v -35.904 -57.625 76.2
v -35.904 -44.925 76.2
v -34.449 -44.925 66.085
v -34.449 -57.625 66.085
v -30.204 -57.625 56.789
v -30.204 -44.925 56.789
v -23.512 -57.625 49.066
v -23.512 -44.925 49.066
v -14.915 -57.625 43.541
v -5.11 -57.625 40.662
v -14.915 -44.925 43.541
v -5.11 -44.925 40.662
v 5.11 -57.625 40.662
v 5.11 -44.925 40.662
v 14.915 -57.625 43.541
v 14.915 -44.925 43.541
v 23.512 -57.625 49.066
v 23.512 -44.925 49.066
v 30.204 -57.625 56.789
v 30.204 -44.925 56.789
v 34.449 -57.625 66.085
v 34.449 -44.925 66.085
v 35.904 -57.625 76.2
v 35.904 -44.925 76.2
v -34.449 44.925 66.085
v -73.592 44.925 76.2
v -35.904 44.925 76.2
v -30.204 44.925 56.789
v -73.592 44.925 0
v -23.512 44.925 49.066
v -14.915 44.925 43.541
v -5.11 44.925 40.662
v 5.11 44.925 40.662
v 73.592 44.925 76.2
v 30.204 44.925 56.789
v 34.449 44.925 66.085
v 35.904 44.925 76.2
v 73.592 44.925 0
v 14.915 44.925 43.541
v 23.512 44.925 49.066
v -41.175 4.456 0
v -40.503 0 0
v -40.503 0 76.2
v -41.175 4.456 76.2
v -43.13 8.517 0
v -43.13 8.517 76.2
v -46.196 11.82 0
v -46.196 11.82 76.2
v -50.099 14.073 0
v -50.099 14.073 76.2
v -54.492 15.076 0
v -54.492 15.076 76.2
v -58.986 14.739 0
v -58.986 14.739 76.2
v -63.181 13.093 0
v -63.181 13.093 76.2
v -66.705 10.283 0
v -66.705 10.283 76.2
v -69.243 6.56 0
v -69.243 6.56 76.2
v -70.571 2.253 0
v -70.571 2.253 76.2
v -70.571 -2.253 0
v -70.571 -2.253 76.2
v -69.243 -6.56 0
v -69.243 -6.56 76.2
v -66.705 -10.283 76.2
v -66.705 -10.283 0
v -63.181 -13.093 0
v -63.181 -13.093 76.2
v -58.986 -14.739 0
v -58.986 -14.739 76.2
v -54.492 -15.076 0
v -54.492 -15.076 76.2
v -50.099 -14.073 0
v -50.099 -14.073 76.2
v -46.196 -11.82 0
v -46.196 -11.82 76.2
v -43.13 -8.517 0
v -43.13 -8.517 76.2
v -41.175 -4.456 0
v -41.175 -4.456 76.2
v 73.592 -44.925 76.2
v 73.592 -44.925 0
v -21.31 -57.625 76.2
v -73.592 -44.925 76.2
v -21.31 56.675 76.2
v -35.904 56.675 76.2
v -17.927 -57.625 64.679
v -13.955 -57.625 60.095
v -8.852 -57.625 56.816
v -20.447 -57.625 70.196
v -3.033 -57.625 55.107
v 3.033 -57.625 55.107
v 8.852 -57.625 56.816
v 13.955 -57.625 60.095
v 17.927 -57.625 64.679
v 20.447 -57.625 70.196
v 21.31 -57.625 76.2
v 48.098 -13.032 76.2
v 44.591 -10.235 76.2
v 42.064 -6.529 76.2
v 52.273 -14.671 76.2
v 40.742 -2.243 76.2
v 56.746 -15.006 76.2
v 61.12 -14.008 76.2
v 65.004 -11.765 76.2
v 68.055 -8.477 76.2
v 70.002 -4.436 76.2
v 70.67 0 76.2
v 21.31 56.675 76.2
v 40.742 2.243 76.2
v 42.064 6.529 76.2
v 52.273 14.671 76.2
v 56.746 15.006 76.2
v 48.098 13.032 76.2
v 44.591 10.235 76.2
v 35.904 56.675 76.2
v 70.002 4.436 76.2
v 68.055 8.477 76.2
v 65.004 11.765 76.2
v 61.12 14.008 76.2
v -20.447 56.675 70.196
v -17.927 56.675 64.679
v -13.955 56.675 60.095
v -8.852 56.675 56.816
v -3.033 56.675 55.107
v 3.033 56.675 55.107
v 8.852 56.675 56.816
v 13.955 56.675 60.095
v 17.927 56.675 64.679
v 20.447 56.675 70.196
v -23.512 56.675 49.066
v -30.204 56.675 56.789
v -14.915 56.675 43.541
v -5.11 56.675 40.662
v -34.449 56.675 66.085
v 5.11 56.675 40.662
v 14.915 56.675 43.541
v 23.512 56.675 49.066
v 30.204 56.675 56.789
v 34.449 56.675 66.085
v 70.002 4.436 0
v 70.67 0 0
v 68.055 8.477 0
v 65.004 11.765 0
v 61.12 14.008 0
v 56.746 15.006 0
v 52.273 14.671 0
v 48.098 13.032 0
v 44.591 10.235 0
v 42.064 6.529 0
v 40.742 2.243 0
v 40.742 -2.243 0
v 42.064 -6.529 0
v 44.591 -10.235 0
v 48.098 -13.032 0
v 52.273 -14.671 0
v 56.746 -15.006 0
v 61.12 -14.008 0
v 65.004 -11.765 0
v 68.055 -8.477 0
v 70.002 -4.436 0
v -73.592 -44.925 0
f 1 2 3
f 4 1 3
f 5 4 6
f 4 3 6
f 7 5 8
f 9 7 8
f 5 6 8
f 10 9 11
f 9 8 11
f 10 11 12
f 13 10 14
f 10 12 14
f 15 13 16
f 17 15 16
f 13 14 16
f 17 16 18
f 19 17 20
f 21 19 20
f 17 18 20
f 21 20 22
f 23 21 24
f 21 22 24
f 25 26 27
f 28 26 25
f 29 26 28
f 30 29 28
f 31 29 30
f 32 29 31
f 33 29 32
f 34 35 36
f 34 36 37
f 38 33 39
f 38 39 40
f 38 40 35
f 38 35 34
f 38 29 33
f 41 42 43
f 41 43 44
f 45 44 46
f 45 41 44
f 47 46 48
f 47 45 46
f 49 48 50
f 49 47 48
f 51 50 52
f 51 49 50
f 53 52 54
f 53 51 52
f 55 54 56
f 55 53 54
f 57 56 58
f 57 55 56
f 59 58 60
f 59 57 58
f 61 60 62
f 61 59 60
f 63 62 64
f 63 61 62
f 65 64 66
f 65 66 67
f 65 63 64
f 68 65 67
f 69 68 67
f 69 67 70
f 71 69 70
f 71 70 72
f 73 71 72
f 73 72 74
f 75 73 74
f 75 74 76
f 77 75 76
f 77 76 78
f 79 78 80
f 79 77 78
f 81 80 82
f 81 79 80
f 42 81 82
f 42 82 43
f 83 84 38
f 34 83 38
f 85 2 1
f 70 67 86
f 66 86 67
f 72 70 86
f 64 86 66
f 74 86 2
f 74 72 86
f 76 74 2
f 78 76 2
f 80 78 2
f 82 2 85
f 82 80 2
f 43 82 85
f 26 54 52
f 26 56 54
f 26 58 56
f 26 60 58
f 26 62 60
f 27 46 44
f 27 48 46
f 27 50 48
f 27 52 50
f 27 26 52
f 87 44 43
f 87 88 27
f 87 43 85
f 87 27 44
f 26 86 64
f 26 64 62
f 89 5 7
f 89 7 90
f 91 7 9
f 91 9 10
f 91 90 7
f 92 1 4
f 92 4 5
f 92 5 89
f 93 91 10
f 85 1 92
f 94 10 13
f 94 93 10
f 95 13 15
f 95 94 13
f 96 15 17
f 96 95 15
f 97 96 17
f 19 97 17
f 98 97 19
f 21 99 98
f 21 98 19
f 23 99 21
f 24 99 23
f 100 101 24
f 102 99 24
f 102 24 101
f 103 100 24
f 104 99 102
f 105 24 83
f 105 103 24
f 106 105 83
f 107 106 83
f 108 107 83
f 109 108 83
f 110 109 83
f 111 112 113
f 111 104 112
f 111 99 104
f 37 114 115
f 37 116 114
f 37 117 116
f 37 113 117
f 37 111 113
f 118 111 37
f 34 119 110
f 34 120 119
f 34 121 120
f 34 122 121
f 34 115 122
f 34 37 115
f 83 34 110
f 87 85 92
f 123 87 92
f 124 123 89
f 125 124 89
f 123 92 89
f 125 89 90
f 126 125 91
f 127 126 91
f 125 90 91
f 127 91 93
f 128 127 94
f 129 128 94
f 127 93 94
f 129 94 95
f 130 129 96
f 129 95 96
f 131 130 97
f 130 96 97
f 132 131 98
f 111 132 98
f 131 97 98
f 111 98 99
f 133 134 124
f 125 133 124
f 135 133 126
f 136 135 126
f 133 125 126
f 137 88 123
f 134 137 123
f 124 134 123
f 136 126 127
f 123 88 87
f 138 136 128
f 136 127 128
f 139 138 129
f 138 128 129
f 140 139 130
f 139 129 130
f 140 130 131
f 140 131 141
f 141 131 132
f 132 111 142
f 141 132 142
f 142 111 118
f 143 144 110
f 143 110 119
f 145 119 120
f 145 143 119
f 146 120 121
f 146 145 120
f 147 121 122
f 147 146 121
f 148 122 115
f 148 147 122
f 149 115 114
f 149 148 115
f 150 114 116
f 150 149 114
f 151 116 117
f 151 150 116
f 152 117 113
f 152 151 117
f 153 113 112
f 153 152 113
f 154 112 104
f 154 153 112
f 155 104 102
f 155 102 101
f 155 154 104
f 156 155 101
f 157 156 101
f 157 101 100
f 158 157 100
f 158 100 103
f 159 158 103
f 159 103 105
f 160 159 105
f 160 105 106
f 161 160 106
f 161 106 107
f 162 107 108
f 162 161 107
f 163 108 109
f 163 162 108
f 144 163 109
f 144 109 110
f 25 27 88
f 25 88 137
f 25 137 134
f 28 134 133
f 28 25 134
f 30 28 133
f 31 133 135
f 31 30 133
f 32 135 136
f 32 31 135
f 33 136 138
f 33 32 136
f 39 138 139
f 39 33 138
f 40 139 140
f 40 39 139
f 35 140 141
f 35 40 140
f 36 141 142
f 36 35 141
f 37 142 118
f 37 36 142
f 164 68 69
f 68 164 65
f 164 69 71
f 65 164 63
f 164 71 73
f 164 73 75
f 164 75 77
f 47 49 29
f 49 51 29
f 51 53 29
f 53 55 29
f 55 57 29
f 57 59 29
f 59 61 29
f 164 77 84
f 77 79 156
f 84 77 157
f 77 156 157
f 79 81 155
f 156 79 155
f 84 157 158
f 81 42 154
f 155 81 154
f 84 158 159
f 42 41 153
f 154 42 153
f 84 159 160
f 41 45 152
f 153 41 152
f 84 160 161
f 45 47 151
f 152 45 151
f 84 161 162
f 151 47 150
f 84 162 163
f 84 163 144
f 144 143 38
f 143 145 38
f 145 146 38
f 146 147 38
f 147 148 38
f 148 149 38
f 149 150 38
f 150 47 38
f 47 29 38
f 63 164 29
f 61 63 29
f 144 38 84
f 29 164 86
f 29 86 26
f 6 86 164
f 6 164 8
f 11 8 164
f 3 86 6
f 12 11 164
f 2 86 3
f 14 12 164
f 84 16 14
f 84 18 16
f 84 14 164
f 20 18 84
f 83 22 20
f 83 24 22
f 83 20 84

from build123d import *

# Parameters (mm, degrees)
F0_W     = 147.184163332
F0_H     = 89.8508056998
F0_R     = 15.1184260195
F0_R_2   = 15.0482996588
F1_DEPTH = 76.2
F3_DEPTH = 101.6
F4_DEPTH = 12.7
F6_DEPTH = 114.301


with BuildPart() as f1:
    # F0 (on Top) → F1 (new body)
    with BuildSketch(Plane.XY):
        Rectangle(F0_W, F0_H)
        with Locations((-55.6219257414, 0)):
            Circle(F0_R, mode=Mode.SUBTRACT)
        with Locations((55.6219220161, 0)):
            Circle(F0_R_2, mode=Mode.SUBTRACT)
    extrude(amount=F1_DEPTH)

    # F2 (on face) → F3 (join)
    with BuildSketch(Plane.XZ.offset(44.9254028499)):
        with BuildLine():
            ThreePointArc((-35.903516253, 76.2), (0, 40.296483747), (35.903516253, 76.2))
            Line((35.903516253, 76.2), (-35.903516253, 76.2))
        make_face()
    extrude(amount=-F3_DEPTH)

    # F2 (on face) → F4 (join)
    with BuildSketch(Plane.XZ.offset(44.9254028499)):
        with BuildLine():
            ThreePointArc((-35.903516253, 76.2), (0, 40.296483747), (35.903516253, 76.2))
            Line((35.903516253, 76.2), (-35.903516253, 76.2))
        make_face()
    extrude(amount=F4_DEPTH)

    # F5 (on face) → F6 (cut, through all)
    with BuildSketch(Plane.XZ.offset(57.6254028499)):
        with BuildLine():
            Line((-21.3098982127, 76.2), (21.3098982127, 76.2))
            ThreePointArc((21.3098982127, 76.2), (0, 97.5098982127), (-21.3098982127, 76.2))
        make_face()
        with BuildLine():
            ThreePointArc((-21.3098982127, 76.2), (0, 54.8901017873), (21.3098982127, 76.2))
            Line((21.3098982127, 76.2), (-21.3098982127, 76.2))
        make_face()
    extrude(amount=-F6_DEPTH, mode=Mode.SUBTRACT)


solid = f1.part
